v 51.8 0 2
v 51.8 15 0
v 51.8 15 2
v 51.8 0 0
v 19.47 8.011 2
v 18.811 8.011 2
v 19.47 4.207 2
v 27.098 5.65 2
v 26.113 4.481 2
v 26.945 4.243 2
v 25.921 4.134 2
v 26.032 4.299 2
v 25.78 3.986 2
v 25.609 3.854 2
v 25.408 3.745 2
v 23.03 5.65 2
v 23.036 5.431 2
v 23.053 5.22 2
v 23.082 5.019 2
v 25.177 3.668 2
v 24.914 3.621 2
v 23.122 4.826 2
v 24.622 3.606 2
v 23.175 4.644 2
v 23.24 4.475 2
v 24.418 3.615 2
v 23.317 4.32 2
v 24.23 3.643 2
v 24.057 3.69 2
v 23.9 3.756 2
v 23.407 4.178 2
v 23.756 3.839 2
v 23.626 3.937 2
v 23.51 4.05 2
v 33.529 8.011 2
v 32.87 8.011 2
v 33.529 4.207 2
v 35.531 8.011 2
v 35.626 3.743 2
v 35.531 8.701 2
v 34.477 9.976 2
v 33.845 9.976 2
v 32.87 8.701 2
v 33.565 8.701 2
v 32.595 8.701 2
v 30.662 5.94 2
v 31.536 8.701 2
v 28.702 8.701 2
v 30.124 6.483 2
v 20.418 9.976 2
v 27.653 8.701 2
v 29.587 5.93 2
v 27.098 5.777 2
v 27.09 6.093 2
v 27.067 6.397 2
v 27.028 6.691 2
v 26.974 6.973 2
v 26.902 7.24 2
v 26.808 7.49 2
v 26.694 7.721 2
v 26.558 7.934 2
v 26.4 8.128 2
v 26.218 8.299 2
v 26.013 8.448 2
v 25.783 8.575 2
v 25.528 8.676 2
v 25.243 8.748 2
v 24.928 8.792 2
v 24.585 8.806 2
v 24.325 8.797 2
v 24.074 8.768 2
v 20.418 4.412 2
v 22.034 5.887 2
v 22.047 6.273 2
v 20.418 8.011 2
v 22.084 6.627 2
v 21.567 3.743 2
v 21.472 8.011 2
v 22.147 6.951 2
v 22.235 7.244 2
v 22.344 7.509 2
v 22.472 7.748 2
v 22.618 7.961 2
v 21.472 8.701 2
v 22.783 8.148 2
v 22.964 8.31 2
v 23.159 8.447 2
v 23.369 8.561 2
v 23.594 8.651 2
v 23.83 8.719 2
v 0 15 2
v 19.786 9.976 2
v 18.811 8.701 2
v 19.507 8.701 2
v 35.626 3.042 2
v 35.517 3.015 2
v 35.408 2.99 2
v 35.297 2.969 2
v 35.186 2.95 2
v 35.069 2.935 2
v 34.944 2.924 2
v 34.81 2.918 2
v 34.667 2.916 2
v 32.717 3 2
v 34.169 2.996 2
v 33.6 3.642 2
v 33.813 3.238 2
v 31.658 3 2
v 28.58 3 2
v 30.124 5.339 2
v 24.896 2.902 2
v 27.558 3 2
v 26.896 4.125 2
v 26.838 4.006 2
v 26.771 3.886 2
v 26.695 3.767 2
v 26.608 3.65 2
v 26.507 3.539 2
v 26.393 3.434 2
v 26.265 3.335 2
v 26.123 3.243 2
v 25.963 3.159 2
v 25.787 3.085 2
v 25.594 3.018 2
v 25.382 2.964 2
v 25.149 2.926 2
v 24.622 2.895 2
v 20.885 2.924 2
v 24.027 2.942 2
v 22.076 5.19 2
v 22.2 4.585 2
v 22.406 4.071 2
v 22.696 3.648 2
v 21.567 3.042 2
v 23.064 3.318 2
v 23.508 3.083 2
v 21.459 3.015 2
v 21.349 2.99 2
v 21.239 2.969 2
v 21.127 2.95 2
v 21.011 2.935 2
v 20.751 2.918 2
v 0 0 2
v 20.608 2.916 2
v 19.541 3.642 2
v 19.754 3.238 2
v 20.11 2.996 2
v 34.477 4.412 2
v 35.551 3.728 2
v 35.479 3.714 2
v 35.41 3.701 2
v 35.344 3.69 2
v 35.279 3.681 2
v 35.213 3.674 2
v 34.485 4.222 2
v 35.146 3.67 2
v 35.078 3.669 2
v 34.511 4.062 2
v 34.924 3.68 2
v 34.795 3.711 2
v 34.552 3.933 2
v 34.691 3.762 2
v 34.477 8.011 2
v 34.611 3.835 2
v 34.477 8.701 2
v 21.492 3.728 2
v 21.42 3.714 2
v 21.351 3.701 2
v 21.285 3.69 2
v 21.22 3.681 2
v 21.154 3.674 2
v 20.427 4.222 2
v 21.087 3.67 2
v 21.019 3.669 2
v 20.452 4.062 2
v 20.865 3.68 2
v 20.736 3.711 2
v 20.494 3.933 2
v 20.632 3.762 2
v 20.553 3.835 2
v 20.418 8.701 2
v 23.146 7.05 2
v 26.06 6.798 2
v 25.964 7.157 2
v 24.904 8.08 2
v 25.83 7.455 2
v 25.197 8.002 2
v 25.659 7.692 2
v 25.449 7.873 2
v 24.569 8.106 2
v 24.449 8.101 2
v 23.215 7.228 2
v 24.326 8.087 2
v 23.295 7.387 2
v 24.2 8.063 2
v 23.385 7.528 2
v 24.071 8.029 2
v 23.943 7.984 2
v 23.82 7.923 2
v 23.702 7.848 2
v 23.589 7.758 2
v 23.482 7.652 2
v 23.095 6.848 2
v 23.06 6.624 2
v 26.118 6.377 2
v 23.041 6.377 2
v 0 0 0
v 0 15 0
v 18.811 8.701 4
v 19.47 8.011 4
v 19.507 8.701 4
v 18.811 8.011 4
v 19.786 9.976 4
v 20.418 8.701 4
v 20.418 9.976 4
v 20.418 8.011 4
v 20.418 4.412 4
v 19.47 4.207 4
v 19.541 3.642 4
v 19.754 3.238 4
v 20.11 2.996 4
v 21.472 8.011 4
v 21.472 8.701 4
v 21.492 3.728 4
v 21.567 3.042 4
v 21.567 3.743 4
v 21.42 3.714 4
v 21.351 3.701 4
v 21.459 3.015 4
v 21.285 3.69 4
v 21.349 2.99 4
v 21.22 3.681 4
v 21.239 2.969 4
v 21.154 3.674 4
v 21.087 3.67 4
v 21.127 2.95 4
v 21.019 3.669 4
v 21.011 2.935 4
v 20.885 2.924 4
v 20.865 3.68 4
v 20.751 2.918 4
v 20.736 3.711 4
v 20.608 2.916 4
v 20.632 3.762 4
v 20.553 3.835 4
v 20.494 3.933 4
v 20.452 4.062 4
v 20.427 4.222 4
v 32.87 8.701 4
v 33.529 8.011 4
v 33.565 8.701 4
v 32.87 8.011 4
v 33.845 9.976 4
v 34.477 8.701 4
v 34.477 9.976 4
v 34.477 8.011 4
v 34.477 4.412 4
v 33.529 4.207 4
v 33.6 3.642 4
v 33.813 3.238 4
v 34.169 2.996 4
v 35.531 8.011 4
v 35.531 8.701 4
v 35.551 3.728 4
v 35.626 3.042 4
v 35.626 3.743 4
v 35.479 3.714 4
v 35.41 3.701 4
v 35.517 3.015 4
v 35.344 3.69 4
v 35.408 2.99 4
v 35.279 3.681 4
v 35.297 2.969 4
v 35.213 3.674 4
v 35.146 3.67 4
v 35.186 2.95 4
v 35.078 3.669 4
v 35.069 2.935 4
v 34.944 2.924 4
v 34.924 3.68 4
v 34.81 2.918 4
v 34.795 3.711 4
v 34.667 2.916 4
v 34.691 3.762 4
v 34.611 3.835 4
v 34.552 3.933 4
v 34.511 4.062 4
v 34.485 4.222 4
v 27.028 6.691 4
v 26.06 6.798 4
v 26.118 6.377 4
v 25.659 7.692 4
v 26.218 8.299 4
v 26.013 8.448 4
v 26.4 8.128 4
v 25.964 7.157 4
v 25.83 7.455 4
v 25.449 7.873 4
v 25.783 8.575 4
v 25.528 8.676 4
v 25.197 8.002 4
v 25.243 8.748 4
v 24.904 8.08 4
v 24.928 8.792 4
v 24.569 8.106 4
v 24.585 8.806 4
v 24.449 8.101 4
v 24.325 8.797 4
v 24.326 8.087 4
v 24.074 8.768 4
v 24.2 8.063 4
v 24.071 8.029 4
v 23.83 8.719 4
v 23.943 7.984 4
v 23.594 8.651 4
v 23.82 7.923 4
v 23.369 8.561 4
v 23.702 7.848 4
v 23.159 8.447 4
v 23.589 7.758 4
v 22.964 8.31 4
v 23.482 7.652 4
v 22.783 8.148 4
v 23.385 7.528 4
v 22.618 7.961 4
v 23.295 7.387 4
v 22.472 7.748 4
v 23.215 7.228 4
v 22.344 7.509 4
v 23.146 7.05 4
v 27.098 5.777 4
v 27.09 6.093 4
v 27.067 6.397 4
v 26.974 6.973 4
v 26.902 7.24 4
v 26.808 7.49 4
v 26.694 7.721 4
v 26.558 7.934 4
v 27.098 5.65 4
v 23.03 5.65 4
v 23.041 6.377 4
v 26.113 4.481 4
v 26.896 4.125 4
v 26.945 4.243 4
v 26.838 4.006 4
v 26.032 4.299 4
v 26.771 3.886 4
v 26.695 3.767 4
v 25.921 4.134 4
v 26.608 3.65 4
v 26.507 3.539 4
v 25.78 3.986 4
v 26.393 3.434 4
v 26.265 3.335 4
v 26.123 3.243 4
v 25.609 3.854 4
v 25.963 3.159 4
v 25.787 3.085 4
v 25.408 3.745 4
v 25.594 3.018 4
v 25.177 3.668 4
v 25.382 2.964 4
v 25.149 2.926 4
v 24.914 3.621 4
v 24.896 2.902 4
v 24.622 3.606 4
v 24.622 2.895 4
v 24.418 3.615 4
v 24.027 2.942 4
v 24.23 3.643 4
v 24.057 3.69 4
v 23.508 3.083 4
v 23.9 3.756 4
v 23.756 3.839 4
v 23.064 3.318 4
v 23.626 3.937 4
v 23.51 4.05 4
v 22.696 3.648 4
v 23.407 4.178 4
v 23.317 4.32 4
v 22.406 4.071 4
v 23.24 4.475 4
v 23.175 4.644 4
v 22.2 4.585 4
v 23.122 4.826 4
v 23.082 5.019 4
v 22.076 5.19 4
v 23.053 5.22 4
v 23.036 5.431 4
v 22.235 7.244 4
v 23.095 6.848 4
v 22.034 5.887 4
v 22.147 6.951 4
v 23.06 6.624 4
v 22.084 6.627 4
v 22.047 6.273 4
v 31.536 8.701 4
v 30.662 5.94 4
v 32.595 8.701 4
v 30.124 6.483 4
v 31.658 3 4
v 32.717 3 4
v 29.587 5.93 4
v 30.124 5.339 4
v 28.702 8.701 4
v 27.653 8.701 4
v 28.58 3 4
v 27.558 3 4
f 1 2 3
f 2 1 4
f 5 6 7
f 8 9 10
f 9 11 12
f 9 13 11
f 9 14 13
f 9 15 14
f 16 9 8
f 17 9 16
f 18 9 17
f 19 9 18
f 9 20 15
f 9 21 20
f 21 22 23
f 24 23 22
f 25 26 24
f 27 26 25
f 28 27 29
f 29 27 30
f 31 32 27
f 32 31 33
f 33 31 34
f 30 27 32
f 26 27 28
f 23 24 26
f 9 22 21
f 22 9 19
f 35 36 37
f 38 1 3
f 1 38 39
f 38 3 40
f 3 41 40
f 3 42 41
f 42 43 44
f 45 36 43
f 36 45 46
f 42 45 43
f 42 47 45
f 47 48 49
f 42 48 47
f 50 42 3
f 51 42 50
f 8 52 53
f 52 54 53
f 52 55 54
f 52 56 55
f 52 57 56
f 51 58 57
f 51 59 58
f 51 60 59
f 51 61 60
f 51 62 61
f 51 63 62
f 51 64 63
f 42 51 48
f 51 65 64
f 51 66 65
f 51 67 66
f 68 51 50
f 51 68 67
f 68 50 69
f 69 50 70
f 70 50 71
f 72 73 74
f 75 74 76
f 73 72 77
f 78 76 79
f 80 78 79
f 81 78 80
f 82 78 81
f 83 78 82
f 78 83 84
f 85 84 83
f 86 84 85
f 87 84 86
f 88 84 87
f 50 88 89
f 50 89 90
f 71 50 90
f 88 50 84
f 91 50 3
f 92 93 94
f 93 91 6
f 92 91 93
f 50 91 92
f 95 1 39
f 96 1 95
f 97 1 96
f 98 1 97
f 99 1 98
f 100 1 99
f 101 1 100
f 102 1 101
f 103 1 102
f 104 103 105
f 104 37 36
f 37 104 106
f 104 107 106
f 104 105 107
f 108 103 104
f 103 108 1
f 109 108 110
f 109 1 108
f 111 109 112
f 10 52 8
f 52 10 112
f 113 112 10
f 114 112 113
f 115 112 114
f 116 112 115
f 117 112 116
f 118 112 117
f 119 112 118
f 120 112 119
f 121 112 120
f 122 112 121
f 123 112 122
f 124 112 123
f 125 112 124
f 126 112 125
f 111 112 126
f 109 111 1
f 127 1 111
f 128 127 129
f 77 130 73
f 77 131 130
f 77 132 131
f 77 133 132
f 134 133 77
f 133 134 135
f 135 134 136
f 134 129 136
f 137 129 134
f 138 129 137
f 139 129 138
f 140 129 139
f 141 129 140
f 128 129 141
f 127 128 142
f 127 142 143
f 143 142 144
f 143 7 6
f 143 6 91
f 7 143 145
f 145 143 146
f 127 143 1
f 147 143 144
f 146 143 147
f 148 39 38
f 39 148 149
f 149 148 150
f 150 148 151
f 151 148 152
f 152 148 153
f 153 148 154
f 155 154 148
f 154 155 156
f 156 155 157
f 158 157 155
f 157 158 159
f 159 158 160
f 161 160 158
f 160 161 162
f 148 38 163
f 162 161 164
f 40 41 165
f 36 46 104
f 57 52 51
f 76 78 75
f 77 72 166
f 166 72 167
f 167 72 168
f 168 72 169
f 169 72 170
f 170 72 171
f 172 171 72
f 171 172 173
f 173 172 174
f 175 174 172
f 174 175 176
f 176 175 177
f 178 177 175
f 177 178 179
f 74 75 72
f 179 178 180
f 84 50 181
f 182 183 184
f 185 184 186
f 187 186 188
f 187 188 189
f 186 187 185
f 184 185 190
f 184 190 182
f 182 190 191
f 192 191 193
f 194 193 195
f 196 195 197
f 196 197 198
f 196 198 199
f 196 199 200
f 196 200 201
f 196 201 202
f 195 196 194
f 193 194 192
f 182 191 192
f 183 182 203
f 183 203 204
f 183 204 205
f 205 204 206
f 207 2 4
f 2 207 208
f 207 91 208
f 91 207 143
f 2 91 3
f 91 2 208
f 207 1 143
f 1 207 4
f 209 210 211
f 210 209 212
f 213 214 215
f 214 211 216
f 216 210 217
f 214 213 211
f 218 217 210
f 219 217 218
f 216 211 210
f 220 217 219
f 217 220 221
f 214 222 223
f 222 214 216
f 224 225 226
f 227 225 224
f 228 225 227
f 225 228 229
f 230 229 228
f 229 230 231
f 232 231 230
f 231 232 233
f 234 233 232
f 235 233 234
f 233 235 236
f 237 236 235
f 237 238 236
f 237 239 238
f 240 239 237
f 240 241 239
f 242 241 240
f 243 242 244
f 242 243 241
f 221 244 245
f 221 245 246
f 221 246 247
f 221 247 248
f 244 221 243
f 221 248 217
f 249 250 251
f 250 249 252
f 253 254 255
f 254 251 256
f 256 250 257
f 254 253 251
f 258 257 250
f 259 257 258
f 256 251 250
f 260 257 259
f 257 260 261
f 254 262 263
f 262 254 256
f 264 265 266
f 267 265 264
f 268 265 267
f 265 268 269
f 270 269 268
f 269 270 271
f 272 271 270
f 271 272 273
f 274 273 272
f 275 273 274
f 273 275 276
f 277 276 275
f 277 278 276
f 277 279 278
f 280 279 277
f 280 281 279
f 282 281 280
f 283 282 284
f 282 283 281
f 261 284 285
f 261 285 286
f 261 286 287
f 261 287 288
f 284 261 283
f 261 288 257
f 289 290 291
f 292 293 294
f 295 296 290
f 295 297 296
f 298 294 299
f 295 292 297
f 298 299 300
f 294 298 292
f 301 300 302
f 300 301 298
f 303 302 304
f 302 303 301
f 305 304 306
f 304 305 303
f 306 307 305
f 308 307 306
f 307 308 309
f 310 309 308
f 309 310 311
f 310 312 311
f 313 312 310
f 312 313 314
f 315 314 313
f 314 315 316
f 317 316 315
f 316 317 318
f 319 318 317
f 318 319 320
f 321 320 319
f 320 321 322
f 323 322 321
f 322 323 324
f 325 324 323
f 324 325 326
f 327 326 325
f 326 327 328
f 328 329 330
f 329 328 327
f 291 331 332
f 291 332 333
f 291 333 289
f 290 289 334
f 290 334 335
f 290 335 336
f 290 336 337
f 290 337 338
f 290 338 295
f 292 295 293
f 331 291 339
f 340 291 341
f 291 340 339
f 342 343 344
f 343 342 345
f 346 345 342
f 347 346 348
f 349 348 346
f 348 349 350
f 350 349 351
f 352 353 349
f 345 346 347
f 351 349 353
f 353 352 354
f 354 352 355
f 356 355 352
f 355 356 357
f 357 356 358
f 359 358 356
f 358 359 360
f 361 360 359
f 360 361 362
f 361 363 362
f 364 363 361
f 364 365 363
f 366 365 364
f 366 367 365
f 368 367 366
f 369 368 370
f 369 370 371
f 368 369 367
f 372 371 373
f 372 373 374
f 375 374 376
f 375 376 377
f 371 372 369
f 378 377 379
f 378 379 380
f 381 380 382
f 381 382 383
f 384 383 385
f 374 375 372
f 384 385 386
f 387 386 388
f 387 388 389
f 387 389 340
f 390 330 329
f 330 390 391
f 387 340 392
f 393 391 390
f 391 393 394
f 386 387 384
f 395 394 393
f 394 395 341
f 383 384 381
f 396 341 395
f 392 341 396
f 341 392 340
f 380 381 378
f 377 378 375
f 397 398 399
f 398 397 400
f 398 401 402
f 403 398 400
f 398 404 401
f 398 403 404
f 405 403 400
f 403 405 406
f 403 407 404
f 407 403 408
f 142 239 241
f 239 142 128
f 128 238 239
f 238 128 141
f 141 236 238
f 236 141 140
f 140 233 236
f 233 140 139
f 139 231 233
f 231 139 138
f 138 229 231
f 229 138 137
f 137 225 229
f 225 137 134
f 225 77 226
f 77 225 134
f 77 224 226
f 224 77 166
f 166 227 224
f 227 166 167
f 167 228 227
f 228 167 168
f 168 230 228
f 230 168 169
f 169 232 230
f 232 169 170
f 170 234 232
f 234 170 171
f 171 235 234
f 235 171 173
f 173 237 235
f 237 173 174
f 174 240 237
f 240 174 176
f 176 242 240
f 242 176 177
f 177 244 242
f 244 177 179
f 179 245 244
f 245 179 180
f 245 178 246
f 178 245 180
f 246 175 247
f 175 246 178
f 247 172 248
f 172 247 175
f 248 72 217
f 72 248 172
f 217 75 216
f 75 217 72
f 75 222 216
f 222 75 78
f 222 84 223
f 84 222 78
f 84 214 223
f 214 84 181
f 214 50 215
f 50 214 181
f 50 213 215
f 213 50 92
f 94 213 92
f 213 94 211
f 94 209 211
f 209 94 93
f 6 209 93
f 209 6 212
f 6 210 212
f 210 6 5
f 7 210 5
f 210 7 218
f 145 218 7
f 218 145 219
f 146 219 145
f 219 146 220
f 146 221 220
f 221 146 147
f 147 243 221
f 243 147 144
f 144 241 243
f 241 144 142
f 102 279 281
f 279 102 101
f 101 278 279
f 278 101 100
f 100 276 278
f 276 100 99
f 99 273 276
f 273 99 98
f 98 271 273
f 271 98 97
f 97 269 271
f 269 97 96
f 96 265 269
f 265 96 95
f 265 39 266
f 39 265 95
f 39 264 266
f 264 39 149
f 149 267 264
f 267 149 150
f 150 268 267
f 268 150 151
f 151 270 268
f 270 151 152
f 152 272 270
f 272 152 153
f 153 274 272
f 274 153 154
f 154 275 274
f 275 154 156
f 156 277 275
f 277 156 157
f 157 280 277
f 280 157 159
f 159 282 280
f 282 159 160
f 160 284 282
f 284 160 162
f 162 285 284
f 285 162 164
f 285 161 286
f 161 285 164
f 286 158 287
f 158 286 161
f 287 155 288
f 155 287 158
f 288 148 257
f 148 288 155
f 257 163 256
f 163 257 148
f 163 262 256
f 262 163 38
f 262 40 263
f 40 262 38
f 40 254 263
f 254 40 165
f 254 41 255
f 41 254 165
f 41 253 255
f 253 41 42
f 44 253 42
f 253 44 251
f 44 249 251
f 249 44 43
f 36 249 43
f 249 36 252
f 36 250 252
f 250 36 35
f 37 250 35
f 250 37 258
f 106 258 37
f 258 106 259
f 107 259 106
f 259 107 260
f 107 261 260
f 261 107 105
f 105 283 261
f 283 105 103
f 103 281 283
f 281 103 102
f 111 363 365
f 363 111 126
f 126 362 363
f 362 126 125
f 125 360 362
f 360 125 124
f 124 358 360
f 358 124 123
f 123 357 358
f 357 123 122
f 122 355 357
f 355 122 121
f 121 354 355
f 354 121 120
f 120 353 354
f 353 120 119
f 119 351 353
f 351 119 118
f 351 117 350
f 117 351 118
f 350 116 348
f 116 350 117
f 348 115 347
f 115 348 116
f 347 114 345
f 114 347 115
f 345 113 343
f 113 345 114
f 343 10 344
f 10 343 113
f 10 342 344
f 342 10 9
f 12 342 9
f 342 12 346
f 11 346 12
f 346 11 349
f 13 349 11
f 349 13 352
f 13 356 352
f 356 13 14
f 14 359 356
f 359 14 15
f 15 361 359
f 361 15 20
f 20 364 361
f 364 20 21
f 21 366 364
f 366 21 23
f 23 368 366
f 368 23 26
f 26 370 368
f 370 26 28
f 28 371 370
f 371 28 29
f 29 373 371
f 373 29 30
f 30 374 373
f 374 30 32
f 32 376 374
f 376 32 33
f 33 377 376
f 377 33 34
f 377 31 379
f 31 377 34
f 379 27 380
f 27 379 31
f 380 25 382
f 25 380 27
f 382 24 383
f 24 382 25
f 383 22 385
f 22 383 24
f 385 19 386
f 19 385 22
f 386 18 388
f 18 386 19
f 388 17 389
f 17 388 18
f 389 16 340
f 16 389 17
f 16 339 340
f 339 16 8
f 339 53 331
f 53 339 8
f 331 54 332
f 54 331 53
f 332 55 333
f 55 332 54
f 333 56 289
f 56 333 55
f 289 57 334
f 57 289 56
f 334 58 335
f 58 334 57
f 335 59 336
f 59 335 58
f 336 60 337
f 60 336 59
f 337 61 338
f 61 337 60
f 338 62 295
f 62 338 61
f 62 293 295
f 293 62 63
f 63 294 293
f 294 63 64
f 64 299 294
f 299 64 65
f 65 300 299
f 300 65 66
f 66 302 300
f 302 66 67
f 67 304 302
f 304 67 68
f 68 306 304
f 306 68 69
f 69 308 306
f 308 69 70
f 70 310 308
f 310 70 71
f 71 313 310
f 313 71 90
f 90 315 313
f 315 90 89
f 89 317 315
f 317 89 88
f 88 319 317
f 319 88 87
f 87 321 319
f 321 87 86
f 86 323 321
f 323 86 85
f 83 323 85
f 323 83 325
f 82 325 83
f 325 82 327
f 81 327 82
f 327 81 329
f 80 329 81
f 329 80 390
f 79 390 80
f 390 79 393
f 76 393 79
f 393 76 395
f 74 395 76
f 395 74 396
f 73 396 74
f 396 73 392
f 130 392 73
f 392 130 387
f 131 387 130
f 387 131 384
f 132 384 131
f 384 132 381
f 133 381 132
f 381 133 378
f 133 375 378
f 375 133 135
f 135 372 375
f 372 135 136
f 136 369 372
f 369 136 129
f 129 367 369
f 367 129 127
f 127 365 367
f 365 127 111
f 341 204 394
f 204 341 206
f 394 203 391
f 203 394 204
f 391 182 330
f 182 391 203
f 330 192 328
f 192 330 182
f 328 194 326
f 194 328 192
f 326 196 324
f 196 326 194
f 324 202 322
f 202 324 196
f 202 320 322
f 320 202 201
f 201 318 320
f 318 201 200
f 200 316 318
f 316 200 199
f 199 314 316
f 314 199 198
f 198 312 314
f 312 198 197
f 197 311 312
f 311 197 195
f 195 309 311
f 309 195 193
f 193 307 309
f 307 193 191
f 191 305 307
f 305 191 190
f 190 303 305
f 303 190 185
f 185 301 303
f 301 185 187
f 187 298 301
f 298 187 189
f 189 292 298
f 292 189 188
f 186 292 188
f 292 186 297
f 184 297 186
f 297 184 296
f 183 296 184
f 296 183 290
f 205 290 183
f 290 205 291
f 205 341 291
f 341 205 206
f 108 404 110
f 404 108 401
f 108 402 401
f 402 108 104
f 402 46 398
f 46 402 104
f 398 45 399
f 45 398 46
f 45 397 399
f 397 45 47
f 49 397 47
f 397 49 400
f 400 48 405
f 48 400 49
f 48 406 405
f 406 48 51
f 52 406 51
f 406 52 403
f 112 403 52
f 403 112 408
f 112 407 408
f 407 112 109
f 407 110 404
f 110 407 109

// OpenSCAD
gap         =   3.7;
board       =  19.0;
thickness   =   2.0;
height      =  60.0;
depth       =  20.0;
width       = 14*gap;
hook_height =  12.0;
hook_thick  =   4.0;
mono        =   6.2;

module text_plate( t = "Text", t_position) {
    cube([width, 0.25*height, thickness]);

    color([0, 1, 1])
    translate([t_position*width, 0.05*height, 0])
    linear_extrude(2*thickness)
    text(t, size = 0.15*width);
}

text_plate("text", 0.36);
